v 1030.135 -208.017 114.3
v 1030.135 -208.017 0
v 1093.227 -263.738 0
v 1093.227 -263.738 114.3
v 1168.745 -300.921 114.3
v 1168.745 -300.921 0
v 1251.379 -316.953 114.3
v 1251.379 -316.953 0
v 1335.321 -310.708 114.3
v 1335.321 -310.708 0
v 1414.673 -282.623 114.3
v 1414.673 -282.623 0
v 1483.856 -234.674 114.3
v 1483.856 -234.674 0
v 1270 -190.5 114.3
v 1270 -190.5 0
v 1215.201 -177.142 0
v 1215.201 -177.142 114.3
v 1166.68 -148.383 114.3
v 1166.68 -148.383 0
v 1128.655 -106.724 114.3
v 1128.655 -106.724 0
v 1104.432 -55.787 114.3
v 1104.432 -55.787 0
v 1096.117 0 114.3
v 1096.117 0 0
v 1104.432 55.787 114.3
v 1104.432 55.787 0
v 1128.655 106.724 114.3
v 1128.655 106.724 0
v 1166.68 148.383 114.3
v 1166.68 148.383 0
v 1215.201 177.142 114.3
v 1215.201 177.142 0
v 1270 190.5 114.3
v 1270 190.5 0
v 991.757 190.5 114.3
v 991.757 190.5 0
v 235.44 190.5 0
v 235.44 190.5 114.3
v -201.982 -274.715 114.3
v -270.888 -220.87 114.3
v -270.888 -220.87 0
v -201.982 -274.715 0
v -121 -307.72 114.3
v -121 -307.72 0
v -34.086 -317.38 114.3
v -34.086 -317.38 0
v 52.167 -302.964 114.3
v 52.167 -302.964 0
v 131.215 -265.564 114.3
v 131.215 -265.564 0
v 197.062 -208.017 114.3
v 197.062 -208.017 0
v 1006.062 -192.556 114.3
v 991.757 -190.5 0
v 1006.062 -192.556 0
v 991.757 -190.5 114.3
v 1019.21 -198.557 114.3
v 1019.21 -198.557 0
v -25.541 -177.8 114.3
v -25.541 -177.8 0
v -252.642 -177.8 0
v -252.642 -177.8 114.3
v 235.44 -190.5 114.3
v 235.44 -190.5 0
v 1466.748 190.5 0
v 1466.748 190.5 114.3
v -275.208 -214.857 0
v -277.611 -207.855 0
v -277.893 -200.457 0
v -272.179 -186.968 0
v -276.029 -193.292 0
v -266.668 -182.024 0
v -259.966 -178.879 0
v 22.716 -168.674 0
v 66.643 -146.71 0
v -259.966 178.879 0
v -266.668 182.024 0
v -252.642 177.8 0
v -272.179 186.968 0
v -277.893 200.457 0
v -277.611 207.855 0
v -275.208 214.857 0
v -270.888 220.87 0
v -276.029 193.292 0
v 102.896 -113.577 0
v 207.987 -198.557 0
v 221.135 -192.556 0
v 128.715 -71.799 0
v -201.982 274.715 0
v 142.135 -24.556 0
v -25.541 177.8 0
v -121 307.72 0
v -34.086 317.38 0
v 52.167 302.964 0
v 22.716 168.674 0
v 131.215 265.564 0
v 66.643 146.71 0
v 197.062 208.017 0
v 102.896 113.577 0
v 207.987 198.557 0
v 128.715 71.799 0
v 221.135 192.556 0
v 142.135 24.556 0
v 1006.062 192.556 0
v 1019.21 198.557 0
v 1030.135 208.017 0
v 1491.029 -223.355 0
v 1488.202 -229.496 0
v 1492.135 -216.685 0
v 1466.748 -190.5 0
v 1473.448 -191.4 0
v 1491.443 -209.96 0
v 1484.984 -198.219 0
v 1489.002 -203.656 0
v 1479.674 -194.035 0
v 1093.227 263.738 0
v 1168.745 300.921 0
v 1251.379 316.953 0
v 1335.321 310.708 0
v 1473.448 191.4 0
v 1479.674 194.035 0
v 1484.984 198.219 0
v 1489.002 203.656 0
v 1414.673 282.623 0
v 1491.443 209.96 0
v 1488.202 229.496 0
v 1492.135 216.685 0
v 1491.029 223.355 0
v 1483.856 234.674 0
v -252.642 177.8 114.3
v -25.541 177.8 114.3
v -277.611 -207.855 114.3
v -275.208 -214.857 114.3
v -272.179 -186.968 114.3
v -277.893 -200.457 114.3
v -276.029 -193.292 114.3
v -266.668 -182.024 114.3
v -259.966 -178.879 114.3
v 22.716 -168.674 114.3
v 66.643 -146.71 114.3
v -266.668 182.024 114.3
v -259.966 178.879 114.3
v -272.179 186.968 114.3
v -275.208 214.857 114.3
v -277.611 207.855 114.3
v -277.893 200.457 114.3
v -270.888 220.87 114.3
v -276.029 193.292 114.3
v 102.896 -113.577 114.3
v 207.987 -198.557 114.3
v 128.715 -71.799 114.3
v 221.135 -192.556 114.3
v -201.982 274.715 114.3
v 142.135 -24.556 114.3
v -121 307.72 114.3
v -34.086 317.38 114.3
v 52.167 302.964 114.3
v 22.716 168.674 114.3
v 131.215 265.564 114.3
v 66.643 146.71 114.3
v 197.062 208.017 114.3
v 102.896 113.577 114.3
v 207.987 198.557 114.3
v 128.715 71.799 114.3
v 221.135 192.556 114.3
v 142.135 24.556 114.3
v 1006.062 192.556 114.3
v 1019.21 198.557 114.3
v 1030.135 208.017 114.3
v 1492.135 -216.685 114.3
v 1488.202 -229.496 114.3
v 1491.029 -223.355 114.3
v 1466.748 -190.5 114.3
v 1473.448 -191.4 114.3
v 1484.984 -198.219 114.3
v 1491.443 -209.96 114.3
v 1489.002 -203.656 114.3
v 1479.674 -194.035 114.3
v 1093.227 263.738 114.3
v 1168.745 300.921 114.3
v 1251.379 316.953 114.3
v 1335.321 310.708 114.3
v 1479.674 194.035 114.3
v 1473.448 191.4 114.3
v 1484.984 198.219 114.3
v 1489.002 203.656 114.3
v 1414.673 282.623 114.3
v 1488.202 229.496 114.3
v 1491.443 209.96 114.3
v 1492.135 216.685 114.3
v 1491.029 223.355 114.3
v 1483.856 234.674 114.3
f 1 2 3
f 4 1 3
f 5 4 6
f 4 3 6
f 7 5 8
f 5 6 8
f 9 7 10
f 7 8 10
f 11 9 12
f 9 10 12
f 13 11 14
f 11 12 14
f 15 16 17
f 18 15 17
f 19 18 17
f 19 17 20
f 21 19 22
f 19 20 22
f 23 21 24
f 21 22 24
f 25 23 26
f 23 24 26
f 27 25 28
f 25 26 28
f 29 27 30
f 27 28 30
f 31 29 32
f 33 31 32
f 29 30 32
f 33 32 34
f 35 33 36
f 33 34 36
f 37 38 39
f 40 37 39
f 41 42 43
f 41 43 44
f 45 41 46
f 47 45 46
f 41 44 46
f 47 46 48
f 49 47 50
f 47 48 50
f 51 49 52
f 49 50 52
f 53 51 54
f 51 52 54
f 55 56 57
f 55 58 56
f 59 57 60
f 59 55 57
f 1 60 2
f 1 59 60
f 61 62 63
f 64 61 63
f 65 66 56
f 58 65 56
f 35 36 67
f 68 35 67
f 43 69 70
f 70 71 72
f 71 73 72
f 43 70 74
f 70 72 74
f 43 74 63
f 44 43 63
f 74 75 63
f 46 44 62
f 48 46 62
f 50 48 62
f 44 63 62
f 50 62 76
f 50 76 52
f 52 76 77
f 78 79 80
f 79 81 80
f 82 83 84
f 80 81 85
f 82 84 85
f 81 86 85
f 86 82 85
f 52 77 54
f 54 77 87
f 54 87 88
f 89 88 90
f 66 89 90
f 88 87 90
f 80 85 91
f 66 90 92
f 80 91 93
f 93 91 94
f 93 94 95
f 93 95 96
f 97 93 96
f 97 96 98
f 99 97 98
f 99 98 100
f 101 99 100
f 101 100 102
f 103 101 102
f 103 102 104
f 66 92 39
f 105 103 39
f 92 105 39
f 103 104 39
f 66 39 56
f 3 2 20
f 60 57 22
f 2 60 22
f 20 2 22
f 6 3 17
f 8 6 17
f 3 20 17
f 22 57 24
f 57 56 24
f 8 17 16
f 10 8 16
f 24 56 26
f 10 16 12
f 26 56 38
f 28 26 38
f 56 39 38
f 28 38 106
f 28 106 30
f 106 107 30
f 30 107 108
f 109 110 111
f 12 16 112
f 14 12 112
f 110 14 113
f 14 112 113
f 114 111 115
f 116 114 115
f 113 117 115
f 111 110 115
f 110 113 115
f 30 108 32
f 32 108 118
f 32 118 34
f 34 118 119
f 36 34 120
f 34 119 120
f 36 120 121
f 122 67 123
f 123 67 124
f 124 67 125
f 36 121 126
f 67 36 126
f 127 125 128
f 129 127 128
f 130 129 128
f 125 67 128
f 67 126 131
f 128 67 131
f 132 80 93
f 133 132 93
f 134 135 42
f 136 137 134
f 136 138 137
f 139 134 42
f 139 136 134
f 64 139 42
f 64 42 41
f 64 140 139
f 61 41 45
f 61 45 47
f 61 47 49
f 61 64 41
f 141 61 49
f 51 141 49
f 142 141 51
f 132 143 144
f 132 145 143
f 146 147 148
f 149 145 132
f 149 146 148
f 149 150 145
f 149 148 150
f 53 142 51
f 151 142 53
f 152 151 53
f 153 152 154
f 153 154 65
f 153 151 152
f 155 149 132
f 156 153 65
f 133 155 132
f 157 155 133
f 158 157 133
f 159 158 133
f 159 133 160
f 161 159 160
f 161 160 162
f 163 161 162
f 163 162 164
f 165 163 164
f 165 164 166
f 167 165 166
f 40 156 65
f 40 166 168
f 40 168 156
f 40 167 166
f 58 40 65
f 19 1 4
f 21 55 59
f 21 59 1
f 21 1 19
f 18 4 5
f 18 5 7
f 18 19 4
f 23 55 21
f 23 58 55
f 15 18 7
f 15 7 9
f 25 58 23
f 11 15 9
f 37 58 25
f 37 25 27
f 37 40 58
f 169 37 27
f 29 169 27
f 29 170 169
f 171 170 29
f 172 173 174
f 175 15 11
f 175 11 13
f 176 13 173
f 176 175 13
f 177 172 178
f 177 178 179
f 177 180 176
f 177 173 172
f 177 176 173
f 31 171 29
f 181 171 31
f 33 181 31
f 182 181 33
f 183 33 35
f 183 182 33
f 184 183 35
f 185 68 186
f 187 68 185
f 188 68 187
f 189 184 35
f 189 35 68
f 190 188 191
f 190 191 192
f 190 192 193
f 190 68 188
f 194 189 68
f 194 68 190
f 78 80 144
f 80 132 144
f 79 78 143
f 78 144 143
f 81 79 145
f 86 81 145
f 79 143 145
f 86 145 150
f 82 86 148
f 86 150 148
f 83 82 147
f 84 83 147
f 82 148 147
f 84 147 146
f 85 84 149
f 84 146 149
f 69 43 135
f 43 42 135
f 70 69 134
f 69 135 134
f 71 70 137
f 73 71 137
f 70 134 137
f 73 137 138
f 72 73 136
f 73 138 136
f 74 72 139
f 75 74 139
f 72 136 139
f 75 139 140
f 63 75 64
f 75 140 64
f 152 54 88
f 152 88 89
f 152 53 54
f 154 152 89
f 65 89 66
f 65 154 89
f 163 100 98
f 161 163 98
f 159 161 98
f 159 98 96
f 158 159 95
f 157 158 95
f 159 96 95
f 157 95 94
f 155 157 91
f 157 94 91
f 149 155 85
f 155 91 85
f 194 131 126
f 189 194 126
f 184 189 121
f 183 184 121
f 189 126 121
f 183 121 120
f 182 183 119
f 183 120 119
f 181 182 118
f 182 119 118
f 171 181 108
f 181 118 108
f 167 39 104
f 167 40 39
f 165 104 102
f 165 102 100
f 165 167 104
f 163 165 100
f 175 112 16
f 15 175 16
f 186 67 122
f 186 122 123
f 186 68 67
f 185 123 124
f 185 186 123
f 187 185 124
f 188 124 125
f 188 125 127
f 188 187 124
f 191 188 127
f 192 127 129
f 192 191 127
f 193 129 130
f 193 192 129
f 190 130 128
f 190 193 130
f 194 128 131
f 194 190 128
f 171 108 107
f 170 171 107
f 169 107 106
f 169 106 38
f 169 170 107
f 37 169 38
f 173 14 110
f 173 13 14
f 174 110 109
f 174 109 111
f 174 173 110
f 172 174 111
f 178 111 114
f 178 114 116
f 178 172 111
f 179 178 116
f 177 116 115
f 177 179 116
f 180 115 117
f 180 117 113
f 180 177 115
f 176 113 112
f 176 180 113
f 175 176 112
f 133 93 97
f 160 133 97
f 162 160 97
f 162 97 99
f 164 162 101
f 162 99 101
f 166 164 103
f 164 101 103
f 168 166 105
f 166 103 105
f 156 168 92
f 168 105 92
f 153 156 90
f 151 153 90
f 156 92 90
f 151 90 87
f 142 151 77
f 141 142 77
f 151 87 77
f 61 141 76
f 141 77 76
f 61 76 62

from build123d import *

# Parameters (mm, degrees)
F1_DEPTH = 114.3
F2_R     = 50.8
F3_R     = 25.4


with BuildPart() as f1:
    # F0 (on Top) → F1 (new body)
    with BuildSketch(Plane.XY):
        with BuildLine():
            Line((-42.803083, -177.8), (-305.849485, -177.8))
            ThreePointArc((-305.849485, -177.8), (-50.599354, -317.404266), (211.196917, -190.5))
            Line((211.196917, -190.5), (1016, -190.5))
            ThreePointArc((1016, -190.5), (1270, -317.5), (1524, -190.5))
            Line((1524, -190.5), (1270, -190.5))
            ThreePointArc((1270, -190.5), (1096.116526, 0), (1270, 190.5))
            Line((1270, 190.5), (1524, 190.5))
            ThreePointArc((1524, 190.5), (1270, 317.5), (1016, 190.5))
            Line((1016, 190.5), (211.196917, 190.5))
            ThreePointArc((211.196917, 190.5), (-50.599354, 317.404266), (-305.849485, 177.8))
            Line((-305.849485, 177.8), (-42.803083, 177.8))
            ThreePointArc((-42.803083, 177.8), (-34.172165, 178.009361), (-25.541248, 177.8))
            ThreePointArc((-25.541248, 177.8), (143.837196, 0), (-25.541248, -177.8))
            ThreePointArc((-25.541248, -177.8), (-34.172165, -178.009361), (-42.803083, -177.8))
        make_face()
        with BuildLine():
            Line((-25.541248, -177.8), (-42.803083, -177.8))
            ThreePointArc((-42.803083, -177.8), (-34.172165, -178.009361), (-25.541248, -177.8))
        make_face()
        with BuildLine():
            Line((-42.803083, 177.8), (-25.541248, 177.8))
            ThreePointArc((-25.541248, 177.8), (-34.172165, 178.009361), (-42.803083, 177.8))
        make_face()
    extrude(amount=F1_DEPTH)

    # F2
    f2_edges = [f1.edges().sort_by_distance(p)[0] for p in [
        (211.196917, 190.5, 57.15),
        (1016, 190.5, 57.15),
        (211.196917, -190.5, 57.15),
        (1016, -190.5, 57.15),
    ]]
    fillet(f2_edges, radius=F2_R)

    # F3
    f3_edges = [f1.edges().sort_by_distance(p)[0] for p in [
        (-305.849485, 177.8, 57.15),
        (-305.849485, -177.8, 57.15),
        (1524, 190.5, 57.15),
        (1524, -190.5, 57.15),
    ]]
    fillet(f3_edges, radius=F3_R)


solid = f1.part
